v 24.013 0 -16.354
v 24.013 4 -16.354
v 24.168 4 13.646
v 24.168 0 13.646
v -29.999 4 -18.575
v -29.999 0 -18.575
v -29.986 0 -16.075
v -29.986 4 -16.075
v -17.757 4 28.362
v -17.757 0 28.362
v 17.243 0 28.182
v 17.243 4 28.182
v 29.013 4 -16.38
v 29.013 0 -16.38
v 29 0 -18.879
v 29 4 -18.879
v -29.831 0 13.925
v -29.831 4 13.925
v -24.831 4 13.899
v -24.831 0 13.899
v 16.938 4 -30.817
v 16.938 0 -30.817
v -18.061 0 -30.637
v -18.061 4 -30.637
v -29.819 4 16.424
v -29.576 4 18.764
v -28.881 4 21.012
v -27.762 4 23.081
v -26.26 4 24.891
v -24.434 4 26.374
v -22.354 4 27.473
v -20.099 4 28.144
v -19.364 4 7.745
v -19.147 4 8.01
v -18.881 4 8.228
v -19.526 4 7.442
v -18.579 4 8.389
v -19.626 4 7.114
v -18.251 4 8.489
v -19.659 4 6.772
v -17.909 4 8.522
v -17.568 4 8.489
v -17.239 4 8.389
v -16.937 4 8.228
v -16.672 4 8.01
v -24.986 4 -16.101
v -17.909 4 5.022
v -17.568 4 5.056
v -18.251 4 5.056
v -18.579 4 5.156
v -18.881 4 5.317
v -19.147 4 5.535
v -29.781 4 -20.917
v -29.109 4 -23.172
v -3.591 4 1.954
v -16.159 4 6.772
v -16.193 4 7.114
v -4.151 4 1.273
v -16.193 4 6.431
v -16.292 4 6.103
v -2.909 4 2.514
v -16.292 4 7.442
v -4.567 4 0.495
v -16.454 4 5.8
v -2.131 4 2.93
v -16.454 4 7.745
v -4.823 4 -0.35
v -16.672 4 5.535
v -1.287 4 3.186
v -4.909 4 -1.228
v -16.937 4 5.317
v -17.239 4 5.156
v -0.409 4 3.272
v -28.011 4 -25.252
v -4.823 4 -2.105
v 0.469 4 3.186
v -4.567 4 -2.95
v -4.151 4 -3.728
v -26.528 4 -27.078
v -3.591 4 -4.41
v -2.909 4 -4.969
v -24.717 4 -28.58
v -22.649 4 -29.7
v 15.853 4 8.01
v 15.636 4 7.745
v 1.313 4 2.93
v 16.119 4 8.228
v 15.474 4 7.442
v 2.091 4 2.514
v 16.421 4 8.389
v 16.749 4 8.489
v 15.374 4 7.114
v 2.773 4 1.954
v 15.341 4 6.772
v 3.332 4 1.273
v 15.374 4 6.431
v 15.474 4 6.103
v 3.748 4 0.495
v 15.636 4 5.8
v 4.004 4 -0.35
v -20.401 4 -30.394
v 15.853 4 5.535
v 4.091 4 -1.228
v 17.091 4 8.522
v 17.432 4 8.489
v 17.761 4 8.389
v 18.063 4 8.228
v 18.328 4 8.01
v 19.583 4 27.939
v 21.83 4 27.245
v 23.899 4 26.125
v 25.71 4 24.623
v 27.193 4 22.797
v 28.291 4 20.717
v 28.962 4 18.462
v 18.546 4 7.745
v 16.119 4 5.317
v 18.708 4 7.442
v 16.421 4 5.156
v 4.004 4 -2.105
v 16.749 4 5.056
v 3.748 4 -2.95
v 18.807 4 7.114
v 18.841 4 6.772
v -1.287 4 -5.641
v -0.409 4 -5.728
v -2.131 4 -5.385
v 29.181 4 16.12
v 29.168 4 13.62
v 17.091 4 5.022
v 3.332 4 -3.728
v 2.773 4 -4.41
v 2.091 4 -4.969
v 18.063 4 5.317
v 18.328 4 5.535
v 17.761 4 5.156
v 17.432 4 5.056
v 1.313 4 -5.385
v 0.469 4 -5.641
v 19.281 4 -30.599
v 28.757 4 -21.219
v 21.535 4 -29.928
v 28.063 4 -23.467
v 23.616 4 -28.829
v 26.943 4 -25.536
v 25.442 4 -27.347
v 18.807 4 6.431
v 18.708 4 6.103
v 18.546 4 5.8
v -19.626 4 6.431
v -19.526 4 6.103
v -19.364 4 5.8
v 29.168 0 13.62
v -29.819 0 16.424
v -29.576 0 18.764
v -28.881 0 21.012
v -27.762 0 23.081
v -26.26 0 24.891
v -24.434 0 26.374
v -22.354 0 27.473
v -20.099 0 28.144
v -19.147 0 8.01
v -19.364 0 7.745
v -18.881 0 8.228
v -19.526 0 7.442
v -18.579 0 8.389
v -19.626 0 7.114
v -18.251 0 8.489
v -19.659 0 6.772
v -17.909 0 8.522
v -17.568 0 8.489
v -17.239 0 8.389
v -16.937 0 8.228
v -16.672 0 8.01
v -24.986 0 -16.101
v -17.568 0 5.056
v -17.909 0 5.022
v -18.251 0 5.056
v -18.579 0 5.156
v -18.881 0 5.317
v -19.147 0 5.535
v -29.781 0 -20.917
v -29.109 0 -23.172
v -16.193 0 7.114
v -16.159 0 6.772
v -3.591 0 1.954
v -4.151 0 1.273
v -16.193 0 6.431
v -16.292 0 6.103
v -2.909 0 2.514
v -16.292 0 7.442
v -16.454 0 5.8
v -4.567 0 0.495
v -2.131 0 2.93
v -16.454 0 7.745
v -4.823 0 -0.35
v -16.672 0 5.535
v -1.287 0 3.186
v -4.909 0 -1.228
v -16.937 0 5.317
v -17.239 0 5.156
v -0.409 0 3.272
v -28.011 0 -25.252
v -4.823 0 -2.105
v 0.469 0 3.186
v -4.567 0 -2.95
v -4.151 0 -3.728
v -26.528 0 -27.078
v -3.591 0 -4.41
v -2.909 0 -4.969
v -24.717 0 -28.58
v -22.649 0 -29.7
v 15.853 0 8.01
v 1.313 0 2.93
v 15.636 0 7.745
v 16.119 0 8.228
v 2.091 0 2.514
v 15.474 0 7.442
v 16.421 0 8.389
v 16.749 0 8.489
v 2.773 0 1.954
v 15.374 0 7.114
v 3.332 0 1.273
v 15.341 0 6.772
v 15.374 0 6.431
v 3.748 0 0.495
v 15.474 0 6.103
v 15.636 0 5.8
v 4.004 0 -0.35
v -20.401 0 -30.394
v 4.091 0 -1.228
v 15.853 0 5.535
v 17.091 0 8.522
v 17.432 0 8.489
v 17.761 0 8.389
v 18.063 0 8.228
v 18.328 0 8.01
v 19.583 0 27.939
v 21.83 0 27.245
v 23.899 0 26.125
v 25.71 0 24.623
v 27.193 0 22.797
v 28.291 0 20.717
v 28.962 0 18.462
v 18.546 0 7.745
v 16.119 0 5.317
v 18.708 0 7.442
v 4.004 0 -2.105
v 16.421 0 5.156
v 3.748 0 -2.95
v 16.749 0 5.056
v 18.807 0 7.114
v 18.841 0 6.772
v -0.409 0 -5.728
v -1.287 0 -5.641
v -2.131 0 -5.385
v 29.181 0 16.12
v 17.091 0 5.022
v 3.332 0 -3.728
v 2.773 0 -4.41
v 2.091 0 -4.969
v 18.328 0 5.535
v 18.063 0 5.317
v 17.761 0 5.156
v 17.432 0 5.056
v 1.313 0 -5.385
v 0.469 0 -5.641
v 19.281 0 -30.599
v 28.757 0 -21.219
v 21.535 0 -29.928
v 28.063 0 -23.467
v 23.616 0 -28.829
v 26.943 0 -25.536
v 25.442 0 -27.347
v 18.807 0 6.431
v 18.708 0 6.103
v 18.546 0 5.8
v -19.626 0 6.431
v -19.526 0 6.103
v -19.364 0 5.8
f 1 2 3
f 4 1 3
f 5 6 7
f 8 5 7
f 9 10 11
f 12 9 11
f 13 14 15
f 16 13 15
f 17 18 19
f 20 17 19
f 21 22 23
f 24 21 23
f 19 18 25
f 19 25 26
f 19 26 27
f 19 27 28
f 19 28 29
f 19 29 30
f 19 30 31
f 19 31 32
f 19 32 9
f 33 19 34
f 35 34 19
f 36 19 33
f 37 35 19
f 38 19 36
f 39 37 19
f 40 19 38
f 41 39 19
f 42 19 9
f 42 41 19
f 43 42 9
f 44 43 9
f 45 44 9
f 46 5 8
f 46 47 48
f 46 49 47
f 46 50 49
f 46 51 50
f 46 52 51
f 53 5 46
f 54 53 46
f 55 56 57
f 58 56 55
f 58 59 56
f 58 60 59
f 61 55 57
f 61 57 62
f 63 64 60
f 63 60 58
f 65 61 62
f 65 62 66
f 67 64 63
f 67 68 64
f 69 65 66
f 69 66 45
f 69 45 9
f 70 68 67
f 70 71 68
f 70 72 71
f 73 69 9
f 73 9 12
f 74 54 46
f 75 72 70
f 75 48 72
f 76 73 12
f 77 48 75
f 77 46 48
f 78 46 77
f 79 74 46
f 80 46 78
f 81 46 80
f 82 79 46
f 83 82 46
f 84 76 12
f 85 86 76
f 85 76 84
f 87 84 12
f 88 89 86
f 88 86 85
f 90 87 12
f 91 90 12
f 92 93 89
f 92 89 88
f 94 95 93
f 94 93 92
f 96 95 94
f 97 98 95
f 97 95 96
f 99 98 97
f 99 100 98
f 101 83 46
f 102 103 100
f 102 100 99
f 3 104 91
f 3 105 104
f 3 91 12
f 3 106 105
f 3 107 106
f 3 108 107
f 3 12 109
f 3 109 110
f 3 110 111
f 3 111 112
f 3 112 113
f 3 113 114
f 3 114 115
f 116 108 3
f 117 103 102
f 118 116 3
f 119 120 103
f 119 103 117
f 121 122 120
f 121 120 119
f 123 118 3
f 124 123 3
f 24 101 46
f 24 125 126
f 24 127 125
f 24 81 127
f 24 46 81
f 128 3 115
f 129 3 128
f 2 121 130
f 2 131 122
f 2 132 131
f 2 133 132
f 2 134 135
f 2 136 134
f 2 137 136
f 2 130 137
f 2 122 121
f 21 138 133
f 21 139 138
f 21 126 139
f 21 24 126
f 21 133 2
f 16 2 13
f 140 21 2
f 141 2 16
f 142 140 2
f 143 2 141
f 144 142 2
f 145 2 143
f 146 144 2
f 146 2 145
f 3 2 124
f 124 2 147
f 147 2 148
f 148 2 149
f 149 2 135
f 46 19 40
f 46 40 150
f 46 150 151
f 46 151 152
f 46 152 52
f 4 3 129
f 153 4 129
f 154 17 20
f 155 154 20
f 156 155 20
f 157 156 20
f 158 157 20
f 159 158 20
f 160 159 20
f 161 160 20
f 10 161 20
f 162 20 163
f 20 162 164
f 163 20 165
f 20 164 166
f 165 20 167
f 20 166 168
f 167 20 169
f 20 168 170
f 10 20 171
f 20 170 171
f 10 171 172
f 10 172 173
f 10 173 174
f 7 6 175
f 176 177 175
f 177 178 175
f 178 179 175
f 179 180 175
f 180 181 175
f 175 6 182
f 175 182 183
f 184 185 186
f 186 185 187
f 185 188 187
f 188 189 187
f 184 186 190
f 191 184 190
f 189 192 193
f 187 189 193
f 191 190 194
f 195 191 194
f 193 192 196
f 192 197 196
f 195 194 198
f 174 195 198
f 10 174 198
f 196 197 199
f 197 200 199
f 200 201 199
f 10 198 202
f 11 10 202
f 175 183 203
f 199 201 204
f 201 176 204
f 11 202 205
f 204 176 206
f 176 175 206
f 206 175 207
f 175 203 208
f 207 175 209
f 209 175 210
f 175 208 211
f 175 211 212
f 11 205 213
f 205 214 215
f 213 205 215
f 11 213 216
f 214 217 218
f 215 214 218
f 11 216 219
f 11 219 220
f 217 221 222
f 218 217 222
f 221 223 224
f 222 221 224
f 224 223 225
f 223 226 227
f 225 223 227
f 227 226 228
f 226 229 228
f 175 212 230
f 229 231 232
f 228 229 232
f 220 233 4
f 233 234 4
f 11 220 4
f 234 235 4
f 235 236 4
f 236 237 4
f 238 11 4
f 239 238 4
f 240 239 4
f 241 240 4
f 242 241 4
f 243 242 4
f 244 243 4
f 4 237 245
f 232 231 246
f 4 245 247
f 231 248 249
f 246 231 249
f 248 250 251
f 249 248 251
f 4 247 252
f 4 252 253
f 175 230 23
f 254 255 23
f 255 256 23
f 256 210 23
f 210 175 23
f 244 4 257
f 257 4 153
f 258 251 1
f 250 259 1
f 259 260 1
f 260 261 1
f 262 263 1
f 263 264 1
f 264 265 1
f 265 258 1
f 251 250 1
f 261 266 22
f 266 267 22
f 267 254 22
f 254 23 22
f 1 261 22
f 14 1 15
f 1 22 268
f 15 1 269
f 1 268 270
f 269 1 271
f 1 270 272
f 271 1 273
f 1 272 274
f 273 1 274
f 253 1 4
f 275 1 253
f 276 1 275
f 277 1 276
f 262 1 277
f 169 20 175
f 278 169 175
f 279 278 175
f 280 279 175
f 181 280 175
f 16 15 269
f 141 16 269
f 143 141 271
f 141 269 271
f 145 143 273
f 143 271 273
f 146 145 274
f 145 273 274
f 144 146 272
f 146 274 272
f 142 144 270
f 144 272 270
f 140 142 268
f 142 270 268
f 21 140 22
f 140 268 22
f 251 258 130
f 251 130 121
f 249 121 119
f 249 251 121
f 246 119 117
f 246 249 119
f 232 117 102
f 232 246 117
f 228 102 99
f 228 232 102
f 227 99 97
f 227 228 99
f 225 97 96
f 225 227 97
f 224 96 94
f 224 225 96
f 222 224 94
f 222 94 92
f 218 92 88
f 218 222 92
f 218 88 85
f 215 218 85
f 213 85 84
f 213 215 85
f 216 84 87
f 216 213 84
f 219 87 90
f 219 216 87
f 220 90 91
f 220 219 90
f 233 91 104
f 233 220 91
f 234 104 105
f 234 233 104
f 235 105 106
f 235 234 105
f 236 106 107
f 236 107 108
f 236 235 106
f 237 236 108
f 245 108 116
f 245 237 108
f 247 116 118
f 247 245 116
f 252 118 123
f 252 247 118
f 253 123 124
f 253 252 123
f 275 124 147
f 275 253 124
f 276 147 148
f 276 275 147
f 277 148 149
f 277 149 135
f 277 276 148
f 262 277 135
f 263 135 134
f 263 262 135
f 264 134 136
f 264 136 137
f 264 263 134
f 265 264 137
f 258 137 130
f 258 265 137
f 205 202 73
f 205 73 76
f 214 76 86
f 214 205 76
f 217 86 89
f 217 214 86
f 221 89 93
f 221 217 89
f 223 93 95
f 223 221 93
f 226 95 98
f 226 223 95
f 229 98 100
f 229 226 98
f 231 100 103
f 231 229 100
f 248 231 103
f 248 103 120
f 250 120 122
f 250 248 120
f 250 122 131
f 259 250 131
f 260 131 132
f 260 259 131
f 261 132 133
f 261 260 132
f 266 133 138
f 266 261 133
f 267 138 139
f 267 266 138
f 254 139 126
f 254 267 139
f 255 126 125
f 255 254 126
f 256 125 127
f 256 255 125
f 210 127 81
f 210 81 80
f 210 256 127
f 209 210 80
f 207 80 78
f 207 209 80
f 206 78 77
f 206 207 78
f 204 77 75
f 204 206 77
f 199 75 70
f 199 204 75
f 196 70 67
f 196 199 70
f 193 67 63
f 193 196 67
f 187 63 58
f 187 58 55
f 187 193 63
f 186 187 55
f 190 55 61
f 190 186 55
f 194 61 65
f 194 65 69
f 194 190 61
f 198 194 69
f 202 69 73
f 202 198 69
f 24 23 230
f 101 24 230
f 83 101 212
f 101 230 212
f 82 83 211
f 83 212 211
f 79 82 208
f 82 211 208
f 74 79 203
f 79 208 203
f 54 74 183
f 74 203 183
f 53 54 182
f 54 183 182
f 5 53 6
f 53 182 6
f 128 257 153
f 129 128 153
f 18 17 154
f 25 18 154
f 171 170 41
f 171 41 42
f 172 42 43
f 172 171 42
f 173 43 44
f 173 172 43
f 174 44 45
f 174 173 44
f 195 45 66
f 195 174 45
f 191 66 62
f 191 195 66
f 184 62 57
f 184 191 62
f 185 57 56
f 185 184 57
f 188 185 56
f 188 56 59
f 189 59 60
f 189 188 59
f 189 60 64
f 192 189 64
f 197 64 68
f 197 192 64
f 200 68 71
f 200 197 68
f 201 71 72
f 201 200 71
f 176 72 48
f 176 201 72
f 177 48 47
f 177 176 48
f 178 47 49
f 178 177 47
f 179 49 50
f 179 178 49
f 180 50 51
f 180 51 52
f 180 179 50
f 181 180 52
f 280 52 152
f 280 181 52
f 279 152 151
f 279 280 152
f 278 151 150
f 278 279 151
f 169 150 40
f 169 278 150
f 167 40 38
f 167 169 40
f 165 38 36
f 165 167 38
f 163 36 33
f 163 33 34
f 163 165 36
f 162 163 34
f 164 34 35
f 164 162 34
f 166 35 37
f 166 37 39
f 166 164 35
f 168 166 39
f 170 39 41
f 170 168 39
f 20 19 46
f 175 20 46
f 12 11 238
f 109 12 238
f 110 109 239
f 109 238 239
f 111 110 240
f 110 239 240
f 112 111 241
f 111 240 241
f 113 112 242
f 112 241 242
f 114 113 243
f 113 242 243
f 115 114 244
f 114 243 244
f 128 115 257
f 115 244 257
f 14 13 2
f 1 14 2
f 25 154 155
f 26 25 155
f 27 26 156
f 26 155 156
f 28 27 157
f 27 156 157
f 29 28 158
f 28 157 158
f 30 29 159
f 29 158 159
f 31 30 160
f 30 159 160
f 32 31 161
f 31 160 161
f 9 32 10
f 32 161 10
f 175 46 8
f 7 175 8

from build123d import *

# Parameters (mm, degrees)
BOSS_EXTRUDE1_DEPTH = 4
CUT_EXTRUDE2_DEPTH  = 32


with BuildPart() as part:
    # Sketch1 → Boss-Extrude1 (new body)
    with BuildSketch(Plane(origin=(0, 0, 0), x_dir=(1, 0, 0), z_dir=(0, 1, 0))):
        with BuildLine():
            Line((29.180693553, -16.120036167), (29.090421484, 1.379731001))
            Line((29.090421484, 1.379731001), (29.000149416, 18.87949817))
            ThreePointArc((29.000149416, 18.87949817), (25.441707043, 27.346536312), (16.938408224, 30.817437667))
            Line((16.938408224, 30.817437667), (-18.061126113, 30.63689353))
            ThreePointArc((-18.061126113, 30.63689353), (-26.528164255, 27.078451157), (-29.99906561, 18.575152338))
            Line((-29.99906561, 18.575152338), (-29.818521473, -16.424381999))
            ThreePointArc((-29.818521473, -16.424381999), (-26.2600791, -24.891420141), (-17.756780281, -28.362321496))
            Line((-17.756780281, -28.362321496), (17.242754056, -28.181777358))
            ThreePointArc((17.242754056, -28.181777358), (25.709792198, -24.623334986), (29.180693553, -16.120036167))
        make_face()
        with BuildLine():
            ThreePointArc((17.090813971, -8.522441914), (18.840813971, -6.772441914), (17.090813971, -5.022441914))
            ThreePointArc((17.090813971, -5.022441914), (15.340813971, -6.772441914), (17.090813971, -8.522441914))
        make_face(mode=Mode.SUBTRACT)
        with BuildLine():
            ThreePointArc((-17.909186029, -5.022441914), (-19.659186029, -6.772441914), (-17.909186029, -8.522441914))
            ThreePointArc((-17.909186029, -8.522441914), (-16.159186029, -6.772441914), (-17.909186029, -5.022441914))
        make_face(mode=Mode.SUBTRACT)
        with BuildLine():
            ThreePointArc((-0.409186029, 5.727558086), (-4.909186029, 1.227558086), (-0.409186029, -3.272441914))
            ThreePointArc((-0.409186029, -3.272441914), (4.090813971, 1.227558086), (-0.409186029, 5.727558086))
        make_face(mode=Mode.SUBTRACT)
    extrude(amount=BOSS_EXTRUDE1_DEPTH)

    # Sketch2 → Cut-Extrude2 (cut)
    with BuildSketch(Plane(origin=(0, 4, 0), x_dir=(1, 0, 0), z_dir=(0, 1, 0))):
        Polygon((-24.831482976, -13.898822811), (-24.986237153, 16.101177189), (-29.98617063, 16.07538517), (-29.831416453, -13.92461483), align=None)
        Polygon((29.167798572, -13.620268999), (29.013044396, 16.379731001), (24.013110919, 16.353938982), (24.167865096, -13.646061018), align=None)
    extrude(amount=-CUT_EXTRUDE2_DEPTH, mode=Mode.SUBTRACT)


solid = part.part
